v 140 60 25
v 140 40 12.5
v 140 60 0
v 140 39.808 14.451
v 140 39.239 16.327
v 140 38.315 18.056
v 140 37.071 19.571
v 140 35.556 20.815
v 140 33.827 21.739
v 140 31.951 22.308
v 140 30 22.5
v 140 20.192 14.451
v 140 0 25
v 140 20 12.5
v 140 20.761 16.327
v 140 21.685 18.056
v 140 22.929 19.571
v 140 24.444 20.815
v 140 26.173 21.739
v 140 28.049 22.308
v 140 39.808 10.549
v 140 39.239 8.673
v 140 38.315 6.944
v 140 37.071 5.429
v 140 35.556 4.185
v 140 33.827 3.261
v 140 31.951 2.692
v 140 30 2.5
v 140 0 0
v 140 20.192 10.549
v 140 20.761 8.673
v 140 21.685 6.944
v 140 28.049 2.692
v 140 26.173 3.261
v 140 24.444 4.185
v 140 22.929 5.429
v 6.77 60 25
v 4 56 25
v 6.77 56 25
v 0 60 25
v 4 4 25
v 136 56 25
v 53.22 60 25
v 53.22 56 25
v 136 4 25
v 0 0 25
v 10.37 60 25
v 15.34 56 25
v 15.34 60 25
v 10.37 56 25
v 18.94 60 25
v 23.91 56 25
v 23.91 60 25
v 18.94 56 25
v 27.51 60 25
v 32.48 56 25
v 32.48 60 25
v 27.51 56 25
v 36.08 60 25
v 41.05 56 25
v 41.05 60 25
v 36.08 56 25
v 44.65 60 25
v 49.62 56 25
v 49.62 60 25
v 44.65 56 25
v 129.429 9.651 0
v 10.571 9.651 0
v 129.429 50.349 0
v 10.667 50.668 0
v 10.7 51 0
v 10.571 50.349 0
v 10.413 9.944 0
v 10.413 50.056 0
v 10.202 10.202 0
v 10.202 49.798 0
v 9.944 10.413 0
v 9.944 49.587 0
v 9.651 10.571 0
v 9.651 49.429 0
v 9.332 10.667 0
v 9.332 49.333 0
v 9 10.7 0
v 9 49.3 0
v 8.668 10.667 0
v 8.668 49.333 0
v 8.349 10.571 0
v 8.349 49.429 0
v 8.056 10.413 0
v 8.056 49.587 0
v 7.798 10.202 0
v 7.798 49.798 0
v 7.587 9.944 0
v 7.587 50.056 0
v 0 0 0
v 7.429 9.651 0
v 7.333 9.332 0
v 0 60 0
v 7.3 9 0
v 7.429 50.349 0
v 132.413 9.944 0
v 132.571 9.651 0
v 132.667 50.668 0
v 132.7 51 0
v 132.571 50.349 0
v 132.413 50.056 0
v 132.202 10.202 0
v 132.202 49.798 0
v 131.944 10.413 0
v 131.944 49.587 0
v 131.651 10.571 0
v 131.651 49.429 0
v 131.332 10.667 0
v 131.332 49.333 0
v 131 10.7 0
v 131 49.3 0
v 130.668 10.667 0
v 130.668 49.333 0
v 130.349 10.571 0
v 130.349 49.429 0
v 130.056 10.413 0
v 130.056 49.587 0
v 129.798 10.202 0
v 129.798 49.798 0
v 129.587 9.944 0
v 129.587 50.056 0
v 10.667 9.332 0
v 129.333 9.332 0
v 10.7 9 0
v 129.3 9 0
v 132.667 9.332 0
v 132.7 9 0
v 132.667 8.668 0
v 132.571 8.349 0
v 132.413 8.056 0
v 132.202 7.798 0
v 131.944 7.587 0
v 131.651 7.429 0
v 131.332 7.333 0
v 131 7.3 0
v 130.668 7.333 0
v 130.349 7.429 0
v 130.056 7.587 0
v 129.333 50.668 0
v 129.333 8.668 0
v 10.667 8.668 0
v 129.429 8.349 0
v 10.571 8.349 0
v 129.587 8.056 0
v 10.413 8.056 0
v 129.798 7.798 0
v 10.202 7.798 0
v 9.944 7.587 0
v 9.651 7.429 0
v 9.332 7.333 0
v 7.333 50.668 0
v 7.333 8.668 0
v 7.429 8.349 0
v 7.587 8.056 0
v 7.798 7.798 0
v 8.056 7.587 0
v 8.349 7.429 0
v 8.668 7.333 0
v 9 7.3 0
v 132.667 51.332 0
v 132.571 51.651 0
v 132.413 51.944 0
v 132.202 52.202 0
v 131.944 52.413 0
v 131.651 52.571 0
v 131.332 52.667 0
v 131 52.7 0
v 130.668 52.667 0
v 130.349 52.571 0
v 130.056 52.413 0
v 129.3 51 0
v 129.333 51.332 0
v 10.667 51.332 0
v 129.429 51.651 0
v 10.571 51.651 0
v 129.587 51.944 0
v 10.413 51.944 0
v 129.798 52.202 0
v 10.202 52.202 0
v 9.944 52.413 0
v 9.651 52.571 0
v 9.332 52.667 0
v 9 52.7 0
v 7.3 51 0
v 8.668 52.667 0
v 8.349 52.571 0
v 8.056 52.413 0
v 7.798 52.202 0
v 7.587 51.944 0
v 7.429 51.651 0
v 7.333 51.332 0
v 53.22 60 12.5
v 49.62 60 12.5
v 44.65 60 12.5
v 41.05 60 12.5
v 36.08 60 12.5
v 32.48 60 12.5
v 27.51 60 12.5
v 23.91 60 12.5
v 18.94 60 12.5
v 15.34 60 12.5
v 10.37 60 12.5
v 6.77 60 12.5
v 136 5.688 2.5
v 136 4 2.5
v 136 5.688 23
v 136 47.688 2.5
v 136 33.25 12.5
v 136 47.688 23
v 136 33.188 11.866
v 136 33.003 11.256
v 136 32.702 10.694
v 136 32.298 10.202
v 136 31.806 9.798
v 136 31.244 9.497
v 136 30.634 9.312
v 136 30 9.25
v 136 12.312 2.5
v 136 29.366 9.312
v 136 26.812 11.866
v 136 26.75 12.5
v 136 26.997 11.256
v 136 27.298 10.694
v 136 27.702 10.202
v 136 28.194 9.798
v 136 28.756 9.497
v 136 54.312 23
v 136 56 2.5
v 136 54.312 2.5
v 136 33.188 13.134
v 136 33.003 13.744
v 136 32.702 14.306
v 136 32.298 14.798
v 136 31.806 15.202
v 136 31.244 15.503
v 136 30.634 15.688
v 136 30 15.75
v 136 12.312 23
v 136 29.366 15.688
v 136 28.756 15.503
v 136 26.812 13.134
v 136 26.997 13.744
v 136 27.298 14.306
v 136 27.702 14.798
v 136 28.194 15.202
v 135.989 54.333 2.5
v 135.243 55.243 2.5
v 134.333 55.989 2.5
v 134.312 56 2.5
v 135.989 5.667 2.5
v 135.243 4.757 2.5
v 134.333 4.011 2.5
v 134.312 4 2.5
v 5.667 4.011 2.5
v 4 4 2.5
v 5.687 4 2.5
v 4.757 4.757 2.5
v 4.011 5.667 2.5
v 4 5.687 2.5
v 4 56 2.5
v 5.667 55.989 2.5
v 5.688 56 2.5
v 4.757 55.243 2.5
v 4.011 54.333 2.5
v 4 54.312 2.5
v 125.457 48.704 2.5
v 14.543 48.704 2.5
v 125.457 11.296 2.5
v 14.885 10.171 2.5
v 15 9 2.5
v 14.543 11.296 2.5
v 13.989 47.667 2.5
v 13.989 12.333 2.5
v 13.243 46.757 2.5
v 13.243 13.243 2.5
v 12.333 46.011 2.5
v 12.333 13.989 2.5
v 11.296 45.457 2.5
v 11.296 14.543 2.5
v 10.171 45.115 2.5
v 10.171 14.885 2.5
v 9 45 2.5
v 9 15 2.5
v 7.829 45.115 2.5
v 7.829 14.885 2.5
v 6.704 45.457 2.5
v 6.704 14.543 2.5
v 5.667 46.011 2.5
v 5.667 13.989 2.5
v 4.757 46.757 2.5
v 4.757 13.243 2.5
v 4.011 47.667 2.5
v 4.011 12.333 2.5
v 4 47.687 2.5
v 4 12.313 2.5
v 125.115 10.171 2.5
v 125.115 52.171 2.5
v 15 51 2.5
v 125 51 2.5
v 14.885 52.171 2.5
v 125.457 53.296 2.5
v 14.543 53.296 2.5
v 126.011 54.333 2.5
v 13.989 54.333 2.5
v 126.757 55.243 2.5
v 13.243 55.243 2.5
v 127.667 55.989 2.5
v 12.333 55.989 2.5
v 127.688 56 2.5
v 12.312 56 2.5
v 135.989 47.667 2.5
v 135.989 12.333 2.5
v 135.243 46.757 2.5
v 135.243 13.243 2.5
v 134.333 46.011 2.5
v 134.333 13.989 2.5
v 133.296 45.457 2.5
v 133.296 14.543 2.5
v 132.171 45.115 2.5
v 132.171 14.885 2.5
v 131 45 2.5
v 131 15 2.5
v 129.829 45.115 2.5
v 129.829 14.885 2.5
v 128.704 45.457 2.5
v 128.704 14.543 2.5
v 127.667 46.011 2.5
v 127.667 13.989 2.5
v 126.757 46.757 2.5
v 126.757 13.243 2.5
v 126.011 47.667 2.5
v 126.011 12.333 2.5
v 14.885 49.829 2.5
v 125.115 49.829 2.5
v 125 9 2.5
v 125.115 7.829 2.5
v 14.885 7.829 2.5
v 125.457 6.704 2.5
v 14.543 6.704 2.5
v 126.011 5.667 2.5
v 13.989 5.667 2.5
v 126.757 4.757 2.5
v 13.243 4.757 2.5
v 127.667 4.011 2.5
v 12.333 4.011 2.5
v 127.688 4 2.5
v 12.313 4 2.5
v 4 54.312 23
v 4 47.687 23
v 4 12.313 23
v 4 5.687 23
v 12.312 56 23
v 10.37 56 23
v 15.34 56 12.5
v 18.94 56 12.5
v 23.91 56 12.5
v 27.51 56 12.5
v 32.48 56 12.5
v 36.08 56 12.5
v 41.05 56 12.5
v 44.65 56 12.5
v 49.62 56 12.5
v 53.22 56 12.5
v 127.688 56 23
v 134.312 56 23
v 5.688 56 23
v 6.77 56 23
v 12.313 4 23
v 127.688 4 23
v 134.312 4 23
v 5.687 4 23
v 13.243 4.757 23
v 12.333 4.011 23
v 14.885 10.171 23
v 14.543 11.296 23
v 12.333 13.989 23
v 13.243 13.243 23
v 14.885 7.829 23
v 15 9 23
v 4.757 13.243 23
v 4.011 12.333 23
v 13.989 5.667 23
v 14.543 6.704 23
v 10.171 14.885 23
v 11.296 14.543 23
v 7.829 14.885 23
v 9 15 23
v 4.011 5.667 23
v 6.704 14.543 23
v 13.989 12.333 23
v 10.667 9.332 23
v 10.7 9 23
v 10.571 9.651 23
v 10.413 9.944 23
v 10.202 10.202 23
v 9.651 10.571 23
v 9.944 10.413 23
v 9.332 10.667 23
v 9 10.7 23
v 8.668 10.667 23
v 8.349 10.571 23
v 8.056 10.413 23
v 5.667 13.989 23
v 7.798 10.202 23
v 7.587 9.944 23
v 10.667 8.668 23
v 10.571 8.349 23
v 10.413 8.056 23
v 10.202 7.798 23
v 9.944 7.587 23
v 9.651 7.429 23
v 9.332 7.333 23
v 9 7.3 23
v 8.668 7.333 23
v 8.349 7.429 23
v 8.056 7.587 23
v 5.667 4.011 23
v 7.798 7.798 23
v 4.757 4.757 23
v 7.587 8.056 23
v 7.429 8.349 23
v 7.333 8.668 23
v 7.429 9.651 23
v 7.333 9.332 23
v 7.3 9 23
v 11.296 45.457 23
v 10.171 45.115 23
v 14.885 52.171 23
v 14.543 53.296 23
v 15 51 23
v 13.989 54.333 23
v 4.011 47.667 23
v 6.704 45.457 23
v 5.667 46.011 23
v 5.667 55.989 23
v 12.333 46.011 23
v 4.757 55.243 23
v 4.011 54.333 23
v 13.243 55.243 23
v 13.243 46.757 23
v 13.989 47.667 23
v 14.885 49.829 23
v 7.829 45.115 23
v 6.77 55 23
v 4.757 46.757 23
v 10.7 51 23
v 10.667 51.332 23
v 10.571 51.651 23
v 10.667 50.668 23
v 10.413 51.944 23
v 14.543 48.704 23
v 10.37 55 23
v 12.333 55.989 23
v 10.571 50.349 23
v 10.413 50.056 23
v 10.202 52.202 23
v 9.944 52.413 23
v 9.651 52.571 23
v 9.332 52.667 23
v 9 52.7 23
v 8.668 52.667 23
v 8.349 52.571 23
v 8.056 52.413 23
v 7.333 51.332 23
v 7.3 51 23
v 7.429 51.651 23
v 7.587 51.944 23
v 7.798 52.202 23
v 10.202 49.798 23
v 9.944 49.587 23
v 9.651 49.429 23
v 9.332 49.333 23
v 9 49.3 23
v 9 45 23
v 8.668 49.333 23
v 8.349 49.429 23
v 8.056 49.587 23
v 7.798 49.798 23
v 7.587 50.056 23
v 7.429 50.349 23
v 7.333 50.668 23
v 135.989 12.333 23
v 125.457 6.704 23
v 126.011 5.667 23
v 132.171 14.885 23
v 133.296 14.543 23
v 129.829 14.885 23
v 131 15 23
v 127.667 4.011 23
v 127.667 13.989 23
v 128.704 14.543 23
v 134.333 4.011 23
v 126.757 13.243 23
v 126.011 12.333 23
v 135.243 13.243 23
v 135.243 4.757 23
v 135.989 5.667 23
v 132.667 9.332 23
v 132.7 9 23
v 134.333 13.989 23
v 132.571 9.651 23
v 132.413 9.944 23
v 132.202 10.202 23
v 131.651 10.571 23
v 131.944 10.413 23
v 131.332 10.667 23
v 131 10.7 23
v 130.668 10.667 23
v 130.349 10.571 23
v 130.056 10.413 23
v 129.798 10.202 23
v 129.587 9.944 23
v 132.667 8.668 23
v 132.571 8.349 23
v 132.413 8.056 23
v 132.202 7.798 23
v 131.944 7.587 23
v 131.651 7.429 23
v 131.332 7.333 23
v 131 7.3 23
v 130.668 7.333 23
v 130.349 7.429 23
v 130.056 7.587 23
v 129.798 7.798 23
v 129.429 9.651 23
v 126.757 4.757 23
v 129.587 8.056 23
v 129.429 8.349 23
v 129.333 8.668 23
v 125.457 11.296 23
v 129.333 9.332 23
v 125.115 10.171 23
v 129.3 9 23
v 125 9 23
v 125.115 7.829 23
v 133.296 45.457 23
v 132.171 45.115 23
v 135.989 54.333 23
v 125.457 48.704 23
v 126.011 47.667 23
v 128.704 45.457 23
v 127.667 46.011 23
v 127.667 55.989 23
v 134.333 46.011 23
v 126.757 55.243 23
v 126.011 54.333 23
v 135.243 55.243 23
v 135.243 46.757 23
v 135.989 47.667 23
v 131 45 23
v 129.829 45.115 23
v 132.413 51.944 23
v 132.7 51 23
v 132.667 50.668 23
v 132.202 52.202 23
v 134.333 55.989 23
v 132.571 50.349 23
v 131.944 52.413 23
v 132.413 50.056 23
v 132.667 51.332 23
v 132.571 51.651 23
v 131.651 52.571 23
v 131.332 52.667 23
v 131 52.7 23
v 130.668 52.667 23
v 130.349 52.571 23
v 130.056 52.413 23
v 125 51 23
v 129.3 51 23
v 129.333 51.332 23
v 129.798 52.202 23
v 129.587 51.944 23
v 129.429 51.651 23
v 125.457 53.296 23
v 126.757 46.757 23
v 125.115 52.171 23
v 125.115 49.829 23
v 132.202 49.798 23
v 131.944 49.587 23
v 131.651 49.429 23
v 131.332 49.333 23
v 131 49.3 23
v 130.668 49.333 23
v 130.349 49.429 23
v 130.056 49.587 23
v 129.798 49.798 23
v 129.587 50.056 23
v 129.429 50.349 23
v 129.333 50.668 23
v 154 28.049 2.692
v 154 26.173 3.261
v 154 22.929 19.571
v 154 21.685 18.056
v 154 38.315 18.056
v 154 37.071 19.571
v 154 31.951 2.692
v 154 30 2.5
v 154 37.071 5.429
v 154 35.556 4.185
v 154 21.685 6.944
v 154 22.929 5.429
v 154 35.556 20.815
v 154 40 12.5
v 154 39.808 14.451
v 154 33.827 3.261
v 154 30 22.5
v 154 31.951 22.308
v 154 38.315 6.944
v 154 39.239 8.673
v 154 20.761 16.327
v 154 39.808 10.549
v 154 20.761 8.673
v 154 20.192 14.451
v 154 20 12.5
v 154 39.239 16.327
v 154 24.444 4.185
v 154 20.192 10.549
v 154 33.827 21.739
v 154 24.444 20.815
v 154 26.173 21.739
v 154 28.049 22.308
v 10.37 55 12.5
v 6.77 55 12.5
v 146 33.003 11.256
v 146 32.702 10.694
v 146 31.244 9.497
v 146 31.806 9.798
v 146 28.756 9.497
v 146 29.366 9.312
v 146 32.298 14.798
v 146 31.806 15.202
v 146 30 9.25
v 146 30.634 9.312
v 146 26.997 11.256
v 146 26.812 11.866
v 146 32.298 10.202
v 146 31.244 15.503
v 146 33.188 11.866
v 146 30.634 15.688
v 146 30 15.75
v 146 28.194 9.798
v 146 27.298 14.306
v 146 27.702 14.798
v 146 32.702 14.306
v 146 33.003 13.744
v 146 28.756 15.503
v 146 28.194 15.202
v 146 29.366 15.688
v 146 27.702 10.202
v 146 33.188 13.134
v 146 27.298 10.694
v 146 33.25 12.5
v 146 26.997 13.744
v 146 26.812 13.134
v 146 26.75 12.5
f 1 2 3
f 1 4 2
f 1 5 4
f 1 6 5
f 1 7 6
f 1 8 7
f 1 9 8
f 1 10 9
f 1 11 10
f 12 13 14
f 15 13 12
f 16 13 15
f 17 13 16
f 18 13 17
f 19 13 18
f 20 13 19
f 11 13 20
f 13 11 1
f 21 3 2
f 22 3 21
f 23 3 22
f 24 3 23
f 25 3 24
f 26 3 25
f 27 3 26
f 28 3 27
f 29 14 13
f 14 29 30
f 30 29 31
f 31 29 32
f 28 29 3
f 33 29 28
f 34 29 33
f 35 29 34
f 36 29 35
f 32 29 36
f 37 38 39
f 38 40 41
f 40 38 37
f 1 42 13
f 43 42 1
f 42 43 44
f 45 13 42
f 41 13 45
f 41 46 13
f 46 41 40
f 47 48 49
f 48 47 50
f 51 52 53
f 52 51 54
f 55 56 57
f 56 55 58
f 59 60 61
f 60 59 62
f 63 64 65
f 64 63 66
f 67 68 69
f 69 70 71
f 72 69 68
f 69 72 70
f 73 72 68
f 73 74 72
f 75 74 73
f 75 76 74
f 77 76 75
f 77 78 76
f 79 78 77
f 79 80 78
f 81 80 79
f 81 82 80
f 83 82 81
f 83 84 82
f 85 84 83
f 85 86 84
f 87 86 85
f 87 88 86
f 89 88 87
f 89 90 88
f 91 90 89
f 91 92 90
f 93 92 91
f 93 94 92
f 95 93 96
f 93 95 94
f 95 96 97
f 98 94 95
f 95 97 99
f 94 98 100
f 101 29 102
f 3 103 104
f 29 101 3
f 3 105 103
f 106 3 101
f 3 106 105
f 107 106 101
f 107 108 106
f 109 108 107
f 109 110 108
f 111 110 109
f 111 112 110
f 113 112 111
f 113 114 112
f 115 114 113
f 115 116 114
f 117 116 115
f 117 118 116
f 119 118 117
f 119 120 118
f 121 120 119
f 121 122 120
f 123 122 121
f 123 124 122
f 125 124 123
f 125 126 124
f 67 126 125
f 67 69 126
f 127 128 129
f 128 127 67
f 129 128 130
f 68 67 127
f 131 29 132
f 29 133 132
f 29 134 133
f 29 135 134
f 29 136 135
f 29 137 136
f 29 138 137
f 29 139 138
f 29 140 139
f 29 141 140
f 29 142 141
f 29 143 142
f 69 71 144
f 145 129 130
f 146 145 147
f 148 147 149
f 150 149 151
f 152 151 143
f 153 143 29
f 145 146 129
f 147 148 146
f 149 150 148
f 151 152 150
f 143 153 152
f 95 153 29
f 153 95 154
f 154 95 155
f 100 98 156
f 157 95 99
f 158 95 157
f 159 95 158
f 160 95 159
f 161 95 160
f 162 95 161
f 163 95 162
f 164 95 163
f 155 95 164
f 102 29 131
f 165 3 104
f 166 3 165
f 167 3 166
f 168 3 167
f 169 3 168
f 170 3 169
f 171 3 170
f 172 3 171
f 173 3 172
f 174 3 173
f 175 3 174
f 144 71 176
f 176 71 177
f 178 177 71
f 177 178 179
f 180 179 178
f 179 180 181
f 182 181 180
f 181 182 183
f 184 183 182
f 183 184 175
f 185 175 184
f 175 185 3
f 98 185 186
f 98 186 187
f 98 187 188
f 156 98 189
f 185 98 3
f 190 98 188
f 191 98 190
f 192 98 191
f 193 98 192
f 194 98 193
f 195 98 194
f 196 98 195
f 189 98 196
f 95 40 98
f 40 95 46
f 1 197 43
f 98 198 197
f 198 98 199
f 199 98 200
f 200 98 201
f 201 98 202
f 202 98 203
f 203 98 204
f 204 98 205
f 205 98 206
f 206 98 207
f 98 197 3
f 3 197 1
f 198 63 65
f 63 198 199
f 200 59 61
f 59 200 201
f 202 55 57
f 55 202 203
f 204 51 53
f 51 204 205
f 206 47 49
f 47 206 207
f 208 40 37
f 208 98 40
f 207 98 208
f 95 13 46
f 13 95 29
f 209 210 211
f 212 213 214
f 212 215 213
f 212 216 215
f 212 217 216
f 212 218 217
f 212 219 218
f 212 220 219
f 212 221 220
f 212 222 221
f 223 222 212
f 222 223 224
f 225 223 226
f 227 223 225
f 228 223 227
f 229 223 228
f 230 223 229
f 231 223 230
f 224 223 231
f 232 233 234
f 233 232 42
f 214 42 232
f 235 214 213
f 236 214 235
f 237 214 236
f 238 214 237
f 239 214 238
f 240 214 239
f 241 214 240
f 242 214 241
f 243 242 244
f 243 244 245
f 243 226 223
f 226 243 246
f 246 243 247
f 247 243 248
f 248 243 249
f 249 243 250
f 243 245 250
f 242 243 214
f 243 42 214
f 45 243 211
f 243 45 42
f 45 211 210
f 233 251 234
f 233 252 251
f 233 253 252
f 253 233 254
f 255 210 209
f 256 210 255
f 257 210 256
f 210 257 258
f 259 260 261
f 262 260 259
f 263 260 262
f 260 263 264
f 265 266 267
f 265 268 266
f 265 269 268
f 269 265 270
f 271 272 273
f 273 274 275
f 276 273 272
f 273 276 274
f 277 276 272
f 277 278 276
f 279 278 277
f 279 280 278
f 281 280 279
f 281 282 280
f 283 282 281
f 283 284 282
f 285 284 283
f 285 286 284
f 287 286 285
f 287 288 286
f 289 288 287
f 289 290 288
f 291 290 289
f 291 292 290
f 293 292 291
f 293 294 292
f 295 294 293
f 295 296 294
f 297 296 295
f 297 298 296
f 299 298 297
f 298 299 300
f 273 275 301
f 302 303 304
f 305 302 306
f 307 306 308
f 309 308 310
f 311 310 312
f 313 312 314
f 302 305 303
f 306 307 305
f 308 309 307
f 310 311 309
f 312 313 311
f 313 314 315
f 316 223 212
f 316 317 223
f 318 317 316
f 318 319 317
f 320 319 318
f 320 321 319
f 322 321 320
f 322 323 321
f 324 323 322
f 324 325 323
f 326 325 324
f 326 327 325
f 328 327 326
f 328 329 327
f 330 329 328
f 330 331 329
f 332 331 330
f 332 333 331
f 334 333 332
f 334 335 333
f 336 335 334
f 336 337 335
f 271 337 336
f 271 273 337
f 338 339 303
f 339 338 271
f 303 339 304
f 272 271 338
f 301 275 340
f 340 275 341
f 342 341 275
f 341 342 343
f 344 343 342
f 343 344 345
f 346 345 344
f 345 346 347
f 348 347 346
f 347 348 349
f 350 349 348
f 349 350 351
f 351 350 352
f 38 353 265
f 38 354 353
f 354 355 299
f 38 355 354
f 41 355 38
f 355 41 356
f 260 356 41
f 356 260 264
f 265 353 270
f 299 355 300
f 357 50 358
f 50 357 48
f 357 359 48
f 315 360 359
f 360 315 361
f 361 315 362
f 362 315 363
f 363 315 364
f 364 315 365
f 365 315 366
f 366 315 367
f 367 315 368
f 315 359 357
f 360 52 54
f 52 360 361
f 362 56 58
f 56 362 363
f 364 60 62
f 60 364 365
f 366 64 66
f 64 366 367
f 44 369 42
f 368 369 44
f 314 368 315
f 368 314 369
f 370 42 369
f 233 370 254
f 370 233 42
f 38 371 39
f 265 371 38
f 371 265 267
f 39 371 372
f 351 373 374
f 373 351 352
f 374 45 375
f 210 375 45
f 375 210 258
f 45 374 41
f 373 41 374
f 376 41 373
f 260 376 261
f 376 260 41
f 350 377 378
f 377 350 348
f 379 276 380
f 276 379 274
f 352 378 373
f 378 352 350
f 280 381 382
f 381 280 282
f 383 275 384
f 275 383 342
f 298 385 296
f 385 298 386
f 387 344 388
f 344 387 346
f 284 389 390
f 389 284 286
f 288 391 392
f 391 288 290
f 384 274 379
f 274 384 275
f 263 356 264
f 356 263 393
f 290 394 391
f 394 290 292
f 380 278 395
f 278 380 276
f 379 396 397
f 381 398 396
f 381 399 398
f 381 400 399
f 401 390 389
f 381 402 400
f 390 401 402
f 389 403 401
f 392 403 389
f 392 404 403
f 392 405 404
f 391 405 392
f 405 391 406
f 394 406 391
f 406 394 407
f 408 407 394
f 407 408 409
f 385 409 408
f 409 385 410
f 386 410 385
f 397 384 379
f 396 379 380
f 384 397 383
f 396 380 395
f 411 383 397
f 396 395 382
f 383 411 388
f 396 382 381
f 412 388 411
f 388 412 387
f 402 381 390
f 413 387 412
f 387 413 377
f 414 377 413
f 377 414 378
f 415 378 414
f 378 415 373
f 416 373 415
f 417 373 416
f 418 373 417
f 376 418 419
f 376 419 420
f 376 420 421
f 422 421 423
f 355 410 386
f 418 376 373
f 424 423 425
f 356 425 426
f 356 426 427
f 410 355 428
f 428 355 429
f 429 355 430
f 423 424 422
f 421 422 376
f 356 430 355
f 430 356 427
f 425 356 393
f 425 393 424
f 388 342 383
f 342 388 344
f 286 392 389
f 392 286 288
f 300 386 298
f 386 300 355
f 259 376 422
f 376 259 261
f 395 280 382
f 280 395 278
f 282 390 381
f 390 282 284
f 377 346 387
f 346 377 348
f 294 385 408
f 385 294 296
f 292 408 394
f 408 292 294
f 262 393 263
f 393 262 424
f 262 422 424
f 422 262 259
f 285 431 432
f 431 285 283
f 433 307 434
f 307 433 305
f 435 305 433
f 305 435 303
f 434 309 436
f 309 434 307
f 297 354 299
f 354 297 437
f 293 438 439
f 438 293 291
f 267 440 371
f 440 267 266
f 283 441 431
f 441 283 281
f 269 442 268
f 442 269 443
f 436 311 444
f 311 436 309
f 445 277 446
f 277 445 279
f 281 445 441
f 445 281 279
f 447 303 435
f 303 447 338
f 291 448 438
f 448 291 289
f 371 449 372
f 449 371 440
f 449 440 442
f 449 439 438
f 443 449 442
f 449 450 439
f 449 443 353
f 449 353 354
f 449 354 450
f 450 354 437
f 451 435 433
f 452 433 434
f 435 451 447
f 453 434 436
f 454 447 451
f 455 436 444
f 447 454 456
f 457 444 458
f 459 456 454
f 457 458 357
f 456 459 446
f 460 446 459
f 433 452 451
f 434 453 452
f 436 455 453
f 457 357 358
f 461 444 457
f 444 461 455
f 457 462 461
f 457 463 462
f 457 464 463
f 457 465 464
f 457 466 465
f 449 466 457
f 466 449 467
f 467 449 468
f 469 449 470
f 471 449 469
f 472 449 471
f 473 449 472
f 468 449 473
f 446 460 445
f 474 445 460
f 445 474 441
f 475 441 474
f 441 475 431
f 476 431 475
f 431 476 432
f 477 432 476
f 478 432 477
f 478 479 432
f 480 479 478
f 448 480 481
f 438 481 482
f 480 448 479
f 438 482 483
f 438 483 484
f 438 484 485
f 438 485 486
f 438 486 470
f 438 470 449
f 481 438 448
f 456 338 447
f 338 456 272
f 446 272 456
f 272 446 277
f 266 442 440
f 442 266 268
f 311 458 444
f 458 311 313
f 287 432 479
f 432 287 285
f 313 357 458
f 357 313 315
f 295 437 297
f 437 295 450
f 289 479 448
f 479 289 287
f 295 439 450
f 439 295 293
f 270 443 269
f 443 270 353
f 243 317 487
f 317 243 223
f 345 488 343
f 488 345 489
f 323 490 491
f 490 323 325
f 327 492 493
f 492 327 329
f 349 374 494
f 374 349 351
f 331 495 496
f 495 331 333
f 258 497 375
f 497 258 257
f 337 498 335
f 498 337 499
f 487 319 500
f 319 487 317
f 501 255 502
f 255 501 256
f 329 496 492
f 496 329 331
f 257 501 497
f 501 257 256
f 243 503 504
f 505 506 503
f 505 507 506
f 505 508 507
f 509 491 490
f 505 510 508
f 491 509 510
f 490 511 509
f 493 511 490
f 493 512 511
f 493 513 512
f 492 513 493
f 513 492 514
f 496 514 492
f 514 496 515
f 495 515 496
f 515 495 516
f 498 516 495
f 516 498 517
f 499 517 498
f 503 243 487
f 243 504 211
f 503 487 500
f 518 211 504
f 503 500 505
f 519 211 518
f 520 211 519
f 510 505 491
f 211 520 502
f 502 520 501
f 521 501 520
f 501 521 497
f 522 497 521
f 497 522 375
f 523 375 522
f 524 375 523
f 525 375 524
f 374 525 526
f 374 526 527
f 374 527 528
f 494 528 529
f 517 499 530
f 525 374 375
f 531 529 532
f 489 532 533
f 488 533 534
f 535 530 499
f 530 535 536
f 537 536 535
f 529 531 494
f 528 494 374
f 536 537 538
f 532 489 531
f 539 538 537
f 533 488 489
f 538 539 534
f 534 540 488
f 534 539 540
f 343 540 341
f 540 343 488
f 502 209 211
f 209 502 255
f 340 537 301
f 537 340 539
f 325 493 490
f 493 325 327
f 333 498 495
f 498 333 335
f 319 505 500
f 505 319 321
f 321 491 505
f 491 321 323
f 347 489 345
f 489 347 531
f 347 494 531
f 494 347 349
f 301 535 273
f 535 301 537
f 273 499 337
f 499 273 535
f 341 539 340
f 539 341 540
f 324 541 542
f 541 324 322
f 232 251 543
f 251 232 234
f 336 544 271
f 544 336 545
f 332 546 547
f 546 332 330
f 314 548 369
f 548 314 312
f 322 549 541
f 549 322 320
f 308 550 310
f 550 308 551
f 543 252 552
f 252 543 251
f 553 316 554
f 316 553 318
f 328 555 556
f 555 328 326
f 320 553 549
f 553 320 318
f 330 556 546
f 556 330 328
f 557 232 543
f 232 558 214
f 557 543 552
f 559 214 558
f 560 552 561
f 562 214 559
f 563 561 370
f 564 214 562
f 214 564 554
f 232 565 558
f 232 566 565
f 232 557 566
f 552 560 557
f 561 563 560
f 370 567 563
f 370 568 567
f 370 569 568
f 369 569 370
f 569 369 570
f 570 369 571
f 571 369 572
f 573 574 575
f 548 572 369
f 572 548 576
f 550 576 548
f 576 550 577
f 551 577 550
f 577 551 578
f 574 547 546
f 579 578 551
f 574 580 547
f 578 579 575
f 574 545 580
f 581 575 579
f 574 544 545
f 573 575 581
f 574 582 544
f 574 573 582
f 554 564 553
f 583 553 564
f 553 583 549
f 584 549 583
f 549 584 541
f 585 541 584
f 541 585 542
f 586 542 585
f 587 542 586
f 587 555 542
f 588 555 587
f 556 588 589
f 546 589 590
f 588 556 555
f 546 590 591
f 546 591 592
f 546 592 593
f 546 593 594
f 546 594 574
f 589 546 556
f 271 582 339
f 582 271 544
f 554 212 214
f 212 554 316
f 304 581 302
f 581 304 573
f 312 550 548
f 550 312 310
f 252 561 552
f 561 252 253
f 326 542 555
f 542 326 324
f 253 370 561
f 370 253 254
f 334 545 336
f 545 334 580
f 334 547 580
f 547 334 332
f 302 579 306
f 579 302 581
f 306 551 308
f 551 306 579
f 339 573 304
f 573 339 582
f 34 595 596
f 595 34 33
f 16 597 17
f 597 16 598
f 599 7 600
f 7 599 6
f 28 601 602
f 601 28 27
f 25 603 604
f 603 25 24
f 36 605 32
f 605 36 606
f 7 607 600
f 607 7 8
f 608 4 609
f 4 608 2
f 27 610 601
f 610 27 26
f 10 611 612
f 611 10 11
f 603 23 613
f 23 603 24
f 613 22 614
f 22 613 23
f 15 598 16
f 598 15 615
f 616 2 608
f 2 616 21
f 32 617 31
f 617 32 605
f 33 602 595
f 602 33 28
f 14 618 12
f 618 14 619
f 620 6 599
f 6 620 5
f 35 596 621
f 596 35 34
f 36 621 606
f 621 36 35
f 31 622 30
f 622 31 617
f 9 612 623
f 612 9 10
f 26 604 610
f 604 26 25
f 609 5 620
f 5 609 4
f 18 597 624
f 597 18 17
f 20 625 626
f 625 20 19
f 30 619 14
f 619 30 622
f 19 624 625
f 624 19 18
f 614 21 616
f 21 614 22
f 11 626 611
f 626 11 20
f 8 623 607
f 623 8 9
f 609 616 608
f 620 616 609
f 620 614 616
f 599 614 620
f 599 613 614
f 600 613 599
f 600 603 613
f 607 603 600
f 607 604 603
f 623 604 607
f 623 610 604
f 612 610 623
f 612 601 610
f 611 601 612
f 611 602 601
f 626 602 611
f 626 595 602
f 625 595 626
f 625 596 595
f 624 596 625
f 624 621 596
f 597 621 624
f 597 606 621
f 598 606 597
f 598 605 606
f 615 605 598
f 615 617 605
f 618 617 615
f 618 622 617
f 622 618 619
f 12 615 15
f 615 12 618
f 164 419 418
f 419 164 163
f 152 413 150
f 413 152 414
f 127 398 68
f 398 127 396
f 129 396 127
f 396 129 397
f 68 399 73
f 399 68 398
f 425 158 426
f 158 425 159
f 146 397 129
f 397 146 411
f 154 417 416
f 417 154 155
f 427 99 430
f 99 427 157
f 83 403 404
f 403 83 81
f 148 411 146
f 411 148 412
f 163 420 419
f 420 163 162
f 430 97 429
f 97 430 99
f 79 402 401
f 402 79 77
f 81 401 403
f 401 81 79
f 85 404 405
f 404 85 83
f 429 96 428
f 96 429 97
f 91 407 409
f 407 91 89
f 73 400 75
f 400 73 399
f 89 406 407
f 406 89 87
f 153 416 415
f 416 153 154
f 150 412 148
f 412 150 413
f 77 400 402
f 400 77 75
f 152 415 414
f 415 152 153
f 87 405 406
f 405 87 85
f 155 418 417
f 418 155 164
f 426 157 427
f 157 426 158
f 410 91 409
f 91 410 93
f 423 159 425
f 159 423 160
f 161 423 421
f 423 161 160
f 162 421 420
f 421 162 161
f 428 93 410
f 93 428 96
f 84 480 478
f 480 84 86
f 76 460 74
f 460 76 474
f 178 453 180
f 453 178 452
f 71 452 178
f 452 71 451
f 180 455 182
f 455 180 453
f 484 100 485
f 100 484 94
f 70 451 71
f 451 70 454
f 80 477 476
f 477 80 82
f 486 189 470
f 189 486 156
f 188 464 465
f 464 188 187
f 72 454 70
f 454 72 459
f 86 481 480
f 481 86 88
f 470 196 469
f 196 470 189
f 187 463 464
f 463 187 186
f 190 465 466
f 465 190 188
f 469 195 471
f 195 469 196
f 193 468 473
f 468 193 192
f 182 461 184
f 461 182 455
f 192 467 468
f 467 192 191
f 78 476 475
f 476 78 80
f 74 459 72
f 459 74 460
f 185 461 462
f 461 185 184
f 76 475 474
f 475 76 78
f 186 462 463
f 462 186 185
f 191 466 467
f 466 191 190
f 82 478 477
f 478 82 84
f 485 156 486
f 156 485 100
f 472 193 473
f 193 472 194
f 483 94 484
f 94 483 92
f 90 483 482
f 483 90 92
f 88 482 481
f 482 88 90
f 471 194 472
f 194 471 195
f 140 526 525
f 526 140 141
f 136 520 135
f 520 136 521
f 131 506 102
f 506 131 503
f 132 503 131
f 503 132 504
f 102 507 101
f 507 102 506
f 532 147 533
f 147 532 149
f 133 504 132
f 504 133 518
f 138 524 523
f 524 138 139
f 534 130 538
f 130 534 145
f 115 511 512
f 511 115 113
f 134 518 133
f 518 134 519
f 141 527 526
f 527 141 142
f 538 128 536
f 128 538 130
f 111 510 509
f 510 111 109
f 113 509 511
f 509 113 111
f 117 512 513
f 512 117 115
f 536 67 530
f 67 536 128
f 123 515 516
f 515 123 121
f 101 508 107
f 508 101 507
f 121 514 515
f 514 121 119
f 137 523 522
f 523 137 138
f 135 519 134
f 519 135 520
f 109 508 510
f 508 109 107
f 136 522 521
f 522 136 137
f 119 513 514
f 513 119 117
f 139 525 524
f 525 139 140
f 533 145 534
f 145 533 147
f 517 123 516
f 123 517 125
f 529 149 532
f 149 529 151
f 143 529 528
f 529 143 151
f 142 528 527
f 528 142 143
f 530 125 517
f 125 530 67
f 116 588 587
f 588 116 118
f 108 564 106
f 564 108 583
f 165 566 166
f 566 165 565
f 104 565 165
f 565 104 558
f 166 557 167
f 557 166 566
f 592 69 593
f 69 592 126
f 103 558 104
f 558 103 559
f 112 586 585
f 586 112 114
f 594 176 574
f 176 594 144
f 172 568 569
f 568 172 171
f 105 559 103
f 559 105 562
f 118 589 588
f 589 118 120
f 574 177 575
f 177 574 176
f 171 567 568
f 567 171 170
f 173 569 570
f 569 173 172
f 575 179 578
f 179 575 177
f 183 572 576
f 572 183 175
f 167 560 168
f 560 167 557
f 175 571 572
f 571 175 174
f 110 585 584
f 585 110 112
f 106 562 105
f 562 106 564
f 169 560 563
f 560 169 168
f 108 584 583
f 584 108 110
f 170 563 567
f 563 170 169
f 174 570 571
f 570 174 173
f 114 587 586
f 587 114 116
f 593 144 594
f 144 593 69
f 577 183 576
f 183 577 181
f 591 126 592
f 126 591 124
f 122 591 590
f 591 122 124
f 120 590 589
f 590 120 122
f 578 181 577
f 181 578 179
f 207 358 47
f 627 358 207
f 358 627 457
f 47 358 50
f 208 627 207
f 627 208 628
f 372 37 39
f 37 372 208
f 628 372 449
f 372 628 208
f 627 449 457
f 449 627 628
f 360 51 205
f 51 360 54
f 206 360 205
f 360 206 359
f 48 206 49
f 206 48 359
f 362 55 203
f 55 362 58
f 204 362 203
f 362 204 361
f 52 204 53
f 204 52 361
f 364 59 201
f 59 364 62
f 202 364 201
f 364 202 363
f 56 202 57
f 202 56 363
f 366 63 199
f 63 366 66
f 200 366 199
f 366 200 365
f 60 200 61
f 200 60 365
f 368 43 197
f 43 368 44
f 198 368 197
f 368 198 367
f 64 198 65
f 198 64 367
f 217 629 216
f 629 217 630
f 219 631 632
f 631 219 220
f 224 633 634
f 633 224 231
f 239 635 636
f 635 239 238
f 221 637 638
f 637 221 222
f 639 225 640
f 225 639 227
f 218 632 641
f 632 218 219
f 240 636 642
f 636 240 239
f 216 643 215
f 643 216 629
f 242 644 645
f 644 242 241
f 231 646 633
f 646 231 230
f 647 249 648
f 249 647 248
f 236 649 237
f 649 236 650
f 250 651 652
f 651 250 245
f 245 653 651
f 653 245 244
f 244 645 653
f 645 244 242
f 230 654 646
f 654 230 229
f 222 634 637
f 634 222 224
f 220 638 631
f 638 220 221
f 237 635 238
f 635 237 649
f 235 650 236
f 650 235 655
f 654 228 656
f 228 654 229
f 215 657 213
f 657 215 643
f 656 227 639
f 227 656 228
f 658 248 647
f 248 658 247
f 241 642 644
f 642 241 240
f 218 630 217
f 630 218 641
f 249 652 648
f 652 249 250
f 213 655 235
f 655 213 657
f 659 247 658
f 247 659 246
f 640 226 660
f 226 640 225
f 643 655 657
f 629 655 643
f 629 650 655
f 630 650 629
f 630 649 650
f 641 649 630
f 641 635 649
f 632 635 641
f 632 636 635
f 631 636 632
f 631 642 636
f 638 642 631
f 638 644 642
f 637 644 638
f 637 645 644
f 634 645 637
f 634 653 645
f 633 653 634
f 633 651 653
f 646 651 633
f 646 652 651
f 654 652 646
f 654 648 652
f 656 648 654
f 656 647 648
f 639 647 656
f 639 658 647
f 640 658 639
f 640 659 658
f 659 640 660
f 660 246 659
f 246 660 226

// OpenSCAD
$fn = 32;

// ----------------------------------------------------------------------
// Enclosure body: 140 x 60 x 25 mm, wall 4 mm
// ----------------------------------------------------------------------

// --- parameters (mm) ---
length = 140;             // outside length, X
width = 60;               // outside width, Y
height = 25;              // outside height, Z
wall = 4;                 // side wall thickness
floor_t = 2.5;            // floor thickness
boss_d = 12;              // corner boss diameter
boss_h = 20.5;            // corner boss height above the floor
boss_hole_d = 3.4;        // lid screw clearance in the boss
boss_lip = 9;             // boss centre inset from the corner
vent_slots = 6;           // vent slots in the long wall
vent_w = 3.6;             // vent slot width
vent_h = 25;              // vent slot height
vent_pitch = 8.57;        // vent slot pitch
vent_z = 12.5;            // vent slot sill height
nipple_d = 20;            // cable gland boss diameter
nipple_h = 14;            // cable gland boss height
nipple_bore = 6.5;        // cable gland bore

module shell() {
  difference() {
    cube([length, width, height]);
    /* hollow, open at the top */
    translate([wall, wall, floor_t])
      cube([length - 2 * wall, width - 2 * wall, height]);
  }
}

module bosses() {
  /* corner bosses, sunk 1 mm into the floor */
  for (sx = [0, 1]) for (sy = [0, 1])
    translate([sx * (length - 2 * boss_lip) + boss_lip, sy * (width - 2 * boss_lip) + boss_lip, floor_t - 1])
      cylinder(h = boss_h + 1, d = boss_d);
}

module gland() {
  /* boss on the short wall, sunk 1 mm into it */
  translate([length - 1, width / 2, height * 0.5]) rotate([0, 90, 0])
    cylinder(h = nipple_h + 1, d = nipple_d);
}

difference() {
  union() {
    shell();
    bosses();
    gland();
  }
  /* boss screw holes */
  for (sx = [0, 1]) for (sy = [0, 1])
    translate([sx * (length - 2 * boss_lip) + boss_lip, sy * (width - 2 * boss_lip) + boss_lip, -1]) cylinder(h = floor_t + boss_h + 2, d = boss_hole_d);
  /* vent grille in the +Y wall */
  for (i = [0 : vent_slots - 1]) translate([vent_pitch * (i + 1) - vent_w / 2, width - wall - 1, vent_z]) cube([vent_w, wall + 2, vent_h]);
  translate([length, width / 2, height * 0.5]) rotate([0, 90, 0]) translate([0, 0, -nipple_h - 2]) cylinder(h = nipple_h + wall + 4, d = nipple_bore);
}
